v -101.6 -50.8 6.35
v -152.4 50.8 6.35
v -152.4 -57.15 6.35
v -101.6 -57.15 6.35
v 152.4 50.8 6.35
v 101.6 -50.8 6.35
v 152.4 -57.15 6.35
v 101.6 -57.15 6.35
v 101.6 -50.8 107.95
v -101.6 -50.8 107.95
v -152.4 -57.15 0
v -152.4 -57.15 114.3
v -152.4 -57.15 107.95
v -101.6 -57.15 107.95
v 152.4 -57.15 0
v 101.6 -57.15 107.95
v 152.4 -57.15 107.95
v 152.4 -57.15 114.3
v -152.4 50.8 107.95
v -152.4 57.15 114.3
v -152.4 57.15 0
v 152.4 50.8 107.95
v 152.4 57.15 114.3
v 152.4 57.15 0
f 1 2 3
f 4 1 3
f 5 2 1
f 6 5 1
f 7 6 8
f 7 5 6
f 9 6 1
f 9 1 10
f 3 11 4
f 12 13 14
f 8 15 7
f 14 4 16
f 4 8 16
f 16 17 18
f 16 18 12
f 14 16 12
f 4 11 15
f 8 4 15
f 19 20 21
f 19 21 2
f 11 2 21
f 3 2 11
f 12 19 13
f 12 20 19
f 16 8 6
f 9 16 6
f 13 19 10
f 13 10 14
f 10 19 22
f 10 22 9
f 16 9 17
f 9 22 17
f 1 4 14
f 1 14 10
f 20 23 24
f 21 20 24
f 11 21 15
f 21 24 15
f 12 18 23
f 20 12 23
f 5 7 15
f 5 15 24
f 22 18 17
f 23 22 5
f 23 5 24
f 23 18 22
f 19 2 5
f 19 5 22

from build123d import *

# Parameters (mm, degrees)
F0_W     = 203.2
F0_H     = 114.3
F1_DEPTH = 114.3
F2_W     = 101.6
F2_H     = 101.6
F3_DEPTH = 203.201
F4_W     = 107.95
F4_H     = 6.35
F5_DEPTH = 50.8
F6_W     = 107.95
F6_H     = 6.35
F7_DEPTH = 50.8


with BuildPart() as f1:
    # F0 (on Top) → F1 (new body)
    with BuildSketch(Plane.XY):
        Rectangle(F0_W, F0_H)
    extrude(amount=F1_DEPTH)

    # F2 (on face) → F3 (cut, through all)
    with BuildSketch(Plane(origin=(-101.6, 0, 0), x_dir=(0, -1, 0), z_dir=(-1, 0, 0))):
        with Locations((0, 57.15)):
            Rectangle(F2_W, F2_H)
    extrude(amount=-F3_DEPTH, mode=Mode.SUBTRACT)

    # F4 (on face) → F5 (join)
    with BuildSketch(Plane.YZ.offset(101.6)):
        Polygon((57.15, 0), (57.15, 114.3), (50.8, 114.3), (50.8, 107.95), (50.8, 6.35), (50.8, 0), align=None)
        with Locations((-3.175, 111.125)):
            Rectangle(F4_W, F4_H)
        with Locations((-3.175, 3.175)):
            Rectangle(F4_W, F4_H)
    extrude(amount=F5_DEPTH)

    # F6 (on face) → F7 (join)
    with BuildSketch(Plane(origin=(-101.6, 0, 0), x_dir=(0, -1, 0), z_dir=(-1, 0, 0))):
        Polygon((-50.8, 114.3), (-57.15, 114.3), (-57.15, 0), (-50.8, 0), (-50.8, 6.35), (-50.8, 107.95), align=None)
        with Locations((3.175, 111.125)):
            Rectangle(F6_W, F6_H)
        with Locations((3.175, 3.175)):
            Rectangle(F6_W, F6_H)
    extrude(amount=F7_DEPTH)


solid = f1.part
